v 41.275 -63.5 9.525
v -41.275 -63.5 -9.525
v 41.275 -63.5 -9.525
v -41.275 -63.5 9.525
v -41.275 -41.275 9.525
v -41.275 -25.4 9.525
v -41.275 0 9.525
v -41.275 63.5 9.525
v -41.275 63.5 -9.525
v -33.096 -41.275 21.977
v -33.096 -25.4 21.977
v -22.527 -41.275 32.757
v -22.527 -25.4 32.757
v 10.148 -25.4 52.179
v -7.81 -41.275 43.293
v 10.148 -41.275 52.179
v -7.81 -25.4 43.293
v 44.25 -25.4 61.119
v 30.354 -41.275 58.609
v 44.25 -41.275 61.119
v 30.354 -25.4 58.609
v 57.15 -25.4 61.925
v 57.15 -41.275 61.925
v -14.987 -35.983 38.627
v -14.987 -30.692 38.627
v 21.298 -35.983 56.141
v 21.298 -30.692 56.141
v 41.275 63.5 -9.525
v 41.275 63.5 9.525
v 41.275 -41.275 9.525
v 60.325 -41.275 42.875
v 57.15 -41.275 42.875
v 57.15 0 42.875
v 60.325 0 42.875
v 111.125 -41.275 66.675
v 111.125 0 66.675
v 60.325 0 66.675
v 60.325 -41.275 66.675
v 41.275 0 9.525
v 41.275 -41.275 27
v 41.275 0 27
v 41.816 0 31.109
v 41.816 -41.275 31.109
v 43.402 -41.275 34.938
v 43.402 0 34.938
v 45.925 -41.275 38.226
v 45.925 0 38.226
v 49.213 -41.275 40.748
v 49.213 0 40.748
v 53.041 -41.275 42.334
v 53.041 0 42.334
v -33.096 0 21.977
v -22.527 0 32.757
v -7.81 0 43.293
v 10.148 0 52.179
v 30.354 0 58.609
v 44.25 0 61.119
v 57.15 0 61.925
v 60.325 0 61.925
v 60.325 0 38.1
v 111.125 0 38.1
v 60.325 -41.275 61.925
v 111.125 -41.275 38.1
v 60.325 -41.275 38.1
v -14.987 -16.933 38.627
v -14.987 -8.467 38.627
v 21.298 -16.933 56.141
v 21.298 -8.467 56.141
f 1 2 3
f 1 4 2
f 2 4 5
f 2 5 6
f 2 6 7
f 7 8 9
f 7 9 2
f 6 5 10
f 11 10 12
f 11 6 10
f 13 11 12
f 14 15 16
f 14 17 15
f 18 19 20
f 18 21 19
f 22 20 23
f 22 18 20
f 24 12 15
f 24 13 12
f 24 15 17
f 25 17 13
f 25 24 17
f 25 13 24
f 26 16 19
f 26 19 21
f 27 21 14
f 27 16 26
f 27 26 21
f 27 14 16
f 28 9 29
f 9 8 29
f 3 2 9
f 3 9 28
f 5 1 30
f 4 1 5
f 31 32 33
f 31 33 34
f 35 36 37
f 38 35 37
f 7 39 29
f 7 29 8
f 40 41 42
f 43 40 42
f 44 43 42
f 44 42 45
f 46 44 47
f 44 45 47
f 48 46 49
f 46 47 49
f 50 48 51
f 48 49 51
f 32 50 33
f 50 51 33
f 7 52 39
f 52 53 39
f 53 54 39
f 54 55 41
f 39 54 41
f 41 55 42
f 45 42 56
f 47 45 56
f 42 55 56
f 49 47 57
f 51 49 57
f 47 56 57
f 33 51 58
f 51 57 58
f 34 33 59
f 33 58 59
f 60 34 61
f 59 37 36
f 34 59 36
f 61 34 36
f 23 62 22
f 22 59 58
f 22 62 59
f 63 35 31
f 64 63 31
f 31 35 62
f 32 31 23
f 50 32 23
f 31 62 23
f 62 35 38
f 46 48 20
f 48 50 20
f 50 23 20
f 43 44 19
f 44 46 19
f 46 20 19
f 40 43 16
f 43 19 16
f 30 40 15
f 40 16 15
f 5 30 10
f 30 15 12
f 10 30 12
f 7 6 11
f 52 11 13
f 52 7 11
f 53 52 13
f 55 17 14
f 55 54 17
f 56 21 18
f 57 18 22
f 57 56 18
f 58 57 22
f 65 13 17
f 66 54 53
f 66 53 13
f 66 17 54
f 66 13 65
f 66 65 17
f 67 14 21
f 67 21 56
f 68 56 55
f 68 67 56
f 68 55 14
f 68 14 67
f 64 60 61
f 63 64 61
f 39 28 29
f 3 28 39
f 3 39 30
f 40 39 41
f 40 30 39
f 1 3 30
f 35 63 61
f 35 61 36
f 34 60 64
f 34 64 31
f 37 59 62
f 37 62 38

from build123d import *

# Parameters (mm, degrees)
F1_DEPTH = 63.5
F0_W     = 25.4
F0_H     = 19.05
F0_H_2   = 4.7498
F0_H_3   = 4.7752
F2_DEPTH = 25.4
F3_DEPTH = 15.875


with BuildPart() as f1:
    # F0 (on Front) → F1 (new body, symmetric)
    with BuildSketch(Plane.XZ):
        Polygon((-41.275, -9.525), (41.275, -9.525), (41.275, 9.525), (22.225, 9.525), (-41.275, 9.525), align=None)
    extrude(amount=F1_DEPTH, both=True)

    # F0 (on Front) → F2 (join)
    with BuildSketch(Plane.XZ):
        Polygon((-41.275, -9.525), (41.275, -9.525), (41.275, 9.525), (22.225, 9.525), (-41.275, 9.525), align=None)
        with BuildLine():
            Line((22.225, 9.525), (41.275, 9.525))
            Line((41.275, 9.525), (41.275, 27.0002))
            ThreePointArc((41.275, 27.0002), (45.9246798487, 38.2255201513), (57.15, 42.8752))
            Line((57.15, 42.8752), (60.325, 42.8752))
            Line((60.325, 42.8752), (60.325, 61.9252))
            Line((60.325, 61.9252), (57.15, 61.9252))
            ThreePointArc((57.15, 61.9252), (32.4542956671, 51.6959043329), (22.225, 27.0002))
            Line((22.225, 27.0002), (22.225, 9.525))
        make_face()
        with BuildLine():
            add(Edge.make_bspline(
                [(-41.275, 9.525), (-23.4616156667, 44.3730577827), (24.9917246401, 62.0542801917), (57.15, 61.9252)],
                knots=[0, 0, 0, 0, 111.5045361635, 111.5045361635, 111.5045361635, 111.5045361635], degree=3))
            Line((-41.275, 9.525), (22.225, 9.525))
            Line((22.225, 9.525), (22.225, 27.0002))
            ThreePointArc((22.225, 27.0002), (32.4542956671, 51.6959043329), (57.15, 61.9252))
        make_face()
        with Locations((73.025, 52.4002)):
            Rectangle(F0_W, F0_H)
        with Locations((73.025, 64.3001)):
            Rectangle(F0_W, F0_H_2)
        with Locations((73.025, 40.4876)):
            Rectangle(F0_W, F0_H_3)
        Polygon((85.725, 66.675), (85.725, 61.9252), (85.725, 42.8752), (85.725, 38.1), (111.125, 38.1), (111.125, 66.675), align=None)
    extrude(amount=F2_DEPTH)

    # F0 (on Front) + F2_face (on face) → F3 (join)
    with BuildSketch(Plane.XZ):
        Polygon((-41.275, -9.525), (41.275, -9.525), (41.275, 9.525), (22.225, 9.525), (-41.275, 9.525), align=None)
        with BuildLine():
            Line((22.225, 9.525), (41.275, 9.525))
            Line((41.275, 9.525), (41.275, 27.0002))
            ThreePointArc((41.275, 27.0002), (45.9246798487, 38.2255201513), (57.15, 42.8752))
            Line((57.15, 42.8752), (60.325, 42.8752))
            Line((60.325, 42.8752), (60.325, 61.9252))
            Line((60.325, 61.9252), (57.15, 61.9252))
            ThreePointArc((57.15, 61.9252), (32.4542956671, 51.6959043329), (22.225, 27.0002))
            Line((22.225, 27.0002), (22.225, 9.525))
        make_face()
        with BuildLine():
            add(Edge.make_bspline(
                [(-41.275, 9.525), (-23.4616156667, 44.3730577827), (24.9917246401, 62.0542801917), (57.15, 61.9252)],
                knots=[0, 0, 0, 0, 111.5045361635, 111.5045361635, 111.5045361635, 111.5045361635], degree=3))
            Line((-41.275, 9.525), (22.225, 9.525))
            Line((22.225, 9.525), (22.225, 27.0002))
            ThreePointArc((22.225, 27.0002), (32.4542956671, 51.6959043329), (57.15, 61.9252))
        make_face()
        with Locations((73.025, 52.4002)):
            Rectangle(F0_W, F0_H)
        with Locations((73.025, 64.3001)):
            Rectangle(F0_W, F0_H_2)
        with Locations((73.025, 40.4876)):
            Rectangle(F0_W, F0_H_3)
        Polygon((85.725, 66.675), (85.725, 61.9252), (85.725, 42.8752), (85.725, 38.1), (111.125, 38.1), (111.125, 66.675), align=None)
    with BuildSketch(Plane(origin=(36.4198277408, -25.4, 38.4190839989), x_dir=(1, 0, 0), z_dir=(0, -1, 0))):
        with BuildLine():
            add(Edge.make_bspline(
                [(-77.6948277408, -28.8940839989), (-59.8814434075, 5.9539737837), (-11.4281031006, 23.6351961927), (20.7301722592, 23.5061160011)],
                knots=[0, 0, 0, 0, 111.5045361635, 111.5045361635, 111.5045361635, 111.5045361635], degree=3))
            Line((-77.6948277408, -28.8940839989), (4.8551722592, -28.8940839989))
            Line((4.8551722592, -28.8940839989), (4.8551722592, -11.4188839989))
            ThreePointArc((4.8551722592, -11.4188839989), (9.5048521079, -0.1935638476), (20.7301722592, 4.4561160011))
            Line((20.7301722592, 4.4561160011), (23.9051722592, 4.4561160011))
            Line((23.9051722592, 4.4561160011), (23.9051722592, -0.3190839989))
            Line((23.9051722592, -0.3190839989), (74.7051722592, -0.3190839989))
            Line((74.7051722592, -0.3190839989), (74.7051722592, 28.2559160011))
            Line((74.7051722592, 28.2559160011), (23.9051722592, 28.2559160011))
            Line((23.9051722592, 28.2559160011), (23.9051722592, 23.5061160011))
            Line((23.9051722592, 23.5061160011), (20.7301722592, 23.5061160011))
        make_face()
    extrude(amount=F3_DEPTH)


solid = f1.part
